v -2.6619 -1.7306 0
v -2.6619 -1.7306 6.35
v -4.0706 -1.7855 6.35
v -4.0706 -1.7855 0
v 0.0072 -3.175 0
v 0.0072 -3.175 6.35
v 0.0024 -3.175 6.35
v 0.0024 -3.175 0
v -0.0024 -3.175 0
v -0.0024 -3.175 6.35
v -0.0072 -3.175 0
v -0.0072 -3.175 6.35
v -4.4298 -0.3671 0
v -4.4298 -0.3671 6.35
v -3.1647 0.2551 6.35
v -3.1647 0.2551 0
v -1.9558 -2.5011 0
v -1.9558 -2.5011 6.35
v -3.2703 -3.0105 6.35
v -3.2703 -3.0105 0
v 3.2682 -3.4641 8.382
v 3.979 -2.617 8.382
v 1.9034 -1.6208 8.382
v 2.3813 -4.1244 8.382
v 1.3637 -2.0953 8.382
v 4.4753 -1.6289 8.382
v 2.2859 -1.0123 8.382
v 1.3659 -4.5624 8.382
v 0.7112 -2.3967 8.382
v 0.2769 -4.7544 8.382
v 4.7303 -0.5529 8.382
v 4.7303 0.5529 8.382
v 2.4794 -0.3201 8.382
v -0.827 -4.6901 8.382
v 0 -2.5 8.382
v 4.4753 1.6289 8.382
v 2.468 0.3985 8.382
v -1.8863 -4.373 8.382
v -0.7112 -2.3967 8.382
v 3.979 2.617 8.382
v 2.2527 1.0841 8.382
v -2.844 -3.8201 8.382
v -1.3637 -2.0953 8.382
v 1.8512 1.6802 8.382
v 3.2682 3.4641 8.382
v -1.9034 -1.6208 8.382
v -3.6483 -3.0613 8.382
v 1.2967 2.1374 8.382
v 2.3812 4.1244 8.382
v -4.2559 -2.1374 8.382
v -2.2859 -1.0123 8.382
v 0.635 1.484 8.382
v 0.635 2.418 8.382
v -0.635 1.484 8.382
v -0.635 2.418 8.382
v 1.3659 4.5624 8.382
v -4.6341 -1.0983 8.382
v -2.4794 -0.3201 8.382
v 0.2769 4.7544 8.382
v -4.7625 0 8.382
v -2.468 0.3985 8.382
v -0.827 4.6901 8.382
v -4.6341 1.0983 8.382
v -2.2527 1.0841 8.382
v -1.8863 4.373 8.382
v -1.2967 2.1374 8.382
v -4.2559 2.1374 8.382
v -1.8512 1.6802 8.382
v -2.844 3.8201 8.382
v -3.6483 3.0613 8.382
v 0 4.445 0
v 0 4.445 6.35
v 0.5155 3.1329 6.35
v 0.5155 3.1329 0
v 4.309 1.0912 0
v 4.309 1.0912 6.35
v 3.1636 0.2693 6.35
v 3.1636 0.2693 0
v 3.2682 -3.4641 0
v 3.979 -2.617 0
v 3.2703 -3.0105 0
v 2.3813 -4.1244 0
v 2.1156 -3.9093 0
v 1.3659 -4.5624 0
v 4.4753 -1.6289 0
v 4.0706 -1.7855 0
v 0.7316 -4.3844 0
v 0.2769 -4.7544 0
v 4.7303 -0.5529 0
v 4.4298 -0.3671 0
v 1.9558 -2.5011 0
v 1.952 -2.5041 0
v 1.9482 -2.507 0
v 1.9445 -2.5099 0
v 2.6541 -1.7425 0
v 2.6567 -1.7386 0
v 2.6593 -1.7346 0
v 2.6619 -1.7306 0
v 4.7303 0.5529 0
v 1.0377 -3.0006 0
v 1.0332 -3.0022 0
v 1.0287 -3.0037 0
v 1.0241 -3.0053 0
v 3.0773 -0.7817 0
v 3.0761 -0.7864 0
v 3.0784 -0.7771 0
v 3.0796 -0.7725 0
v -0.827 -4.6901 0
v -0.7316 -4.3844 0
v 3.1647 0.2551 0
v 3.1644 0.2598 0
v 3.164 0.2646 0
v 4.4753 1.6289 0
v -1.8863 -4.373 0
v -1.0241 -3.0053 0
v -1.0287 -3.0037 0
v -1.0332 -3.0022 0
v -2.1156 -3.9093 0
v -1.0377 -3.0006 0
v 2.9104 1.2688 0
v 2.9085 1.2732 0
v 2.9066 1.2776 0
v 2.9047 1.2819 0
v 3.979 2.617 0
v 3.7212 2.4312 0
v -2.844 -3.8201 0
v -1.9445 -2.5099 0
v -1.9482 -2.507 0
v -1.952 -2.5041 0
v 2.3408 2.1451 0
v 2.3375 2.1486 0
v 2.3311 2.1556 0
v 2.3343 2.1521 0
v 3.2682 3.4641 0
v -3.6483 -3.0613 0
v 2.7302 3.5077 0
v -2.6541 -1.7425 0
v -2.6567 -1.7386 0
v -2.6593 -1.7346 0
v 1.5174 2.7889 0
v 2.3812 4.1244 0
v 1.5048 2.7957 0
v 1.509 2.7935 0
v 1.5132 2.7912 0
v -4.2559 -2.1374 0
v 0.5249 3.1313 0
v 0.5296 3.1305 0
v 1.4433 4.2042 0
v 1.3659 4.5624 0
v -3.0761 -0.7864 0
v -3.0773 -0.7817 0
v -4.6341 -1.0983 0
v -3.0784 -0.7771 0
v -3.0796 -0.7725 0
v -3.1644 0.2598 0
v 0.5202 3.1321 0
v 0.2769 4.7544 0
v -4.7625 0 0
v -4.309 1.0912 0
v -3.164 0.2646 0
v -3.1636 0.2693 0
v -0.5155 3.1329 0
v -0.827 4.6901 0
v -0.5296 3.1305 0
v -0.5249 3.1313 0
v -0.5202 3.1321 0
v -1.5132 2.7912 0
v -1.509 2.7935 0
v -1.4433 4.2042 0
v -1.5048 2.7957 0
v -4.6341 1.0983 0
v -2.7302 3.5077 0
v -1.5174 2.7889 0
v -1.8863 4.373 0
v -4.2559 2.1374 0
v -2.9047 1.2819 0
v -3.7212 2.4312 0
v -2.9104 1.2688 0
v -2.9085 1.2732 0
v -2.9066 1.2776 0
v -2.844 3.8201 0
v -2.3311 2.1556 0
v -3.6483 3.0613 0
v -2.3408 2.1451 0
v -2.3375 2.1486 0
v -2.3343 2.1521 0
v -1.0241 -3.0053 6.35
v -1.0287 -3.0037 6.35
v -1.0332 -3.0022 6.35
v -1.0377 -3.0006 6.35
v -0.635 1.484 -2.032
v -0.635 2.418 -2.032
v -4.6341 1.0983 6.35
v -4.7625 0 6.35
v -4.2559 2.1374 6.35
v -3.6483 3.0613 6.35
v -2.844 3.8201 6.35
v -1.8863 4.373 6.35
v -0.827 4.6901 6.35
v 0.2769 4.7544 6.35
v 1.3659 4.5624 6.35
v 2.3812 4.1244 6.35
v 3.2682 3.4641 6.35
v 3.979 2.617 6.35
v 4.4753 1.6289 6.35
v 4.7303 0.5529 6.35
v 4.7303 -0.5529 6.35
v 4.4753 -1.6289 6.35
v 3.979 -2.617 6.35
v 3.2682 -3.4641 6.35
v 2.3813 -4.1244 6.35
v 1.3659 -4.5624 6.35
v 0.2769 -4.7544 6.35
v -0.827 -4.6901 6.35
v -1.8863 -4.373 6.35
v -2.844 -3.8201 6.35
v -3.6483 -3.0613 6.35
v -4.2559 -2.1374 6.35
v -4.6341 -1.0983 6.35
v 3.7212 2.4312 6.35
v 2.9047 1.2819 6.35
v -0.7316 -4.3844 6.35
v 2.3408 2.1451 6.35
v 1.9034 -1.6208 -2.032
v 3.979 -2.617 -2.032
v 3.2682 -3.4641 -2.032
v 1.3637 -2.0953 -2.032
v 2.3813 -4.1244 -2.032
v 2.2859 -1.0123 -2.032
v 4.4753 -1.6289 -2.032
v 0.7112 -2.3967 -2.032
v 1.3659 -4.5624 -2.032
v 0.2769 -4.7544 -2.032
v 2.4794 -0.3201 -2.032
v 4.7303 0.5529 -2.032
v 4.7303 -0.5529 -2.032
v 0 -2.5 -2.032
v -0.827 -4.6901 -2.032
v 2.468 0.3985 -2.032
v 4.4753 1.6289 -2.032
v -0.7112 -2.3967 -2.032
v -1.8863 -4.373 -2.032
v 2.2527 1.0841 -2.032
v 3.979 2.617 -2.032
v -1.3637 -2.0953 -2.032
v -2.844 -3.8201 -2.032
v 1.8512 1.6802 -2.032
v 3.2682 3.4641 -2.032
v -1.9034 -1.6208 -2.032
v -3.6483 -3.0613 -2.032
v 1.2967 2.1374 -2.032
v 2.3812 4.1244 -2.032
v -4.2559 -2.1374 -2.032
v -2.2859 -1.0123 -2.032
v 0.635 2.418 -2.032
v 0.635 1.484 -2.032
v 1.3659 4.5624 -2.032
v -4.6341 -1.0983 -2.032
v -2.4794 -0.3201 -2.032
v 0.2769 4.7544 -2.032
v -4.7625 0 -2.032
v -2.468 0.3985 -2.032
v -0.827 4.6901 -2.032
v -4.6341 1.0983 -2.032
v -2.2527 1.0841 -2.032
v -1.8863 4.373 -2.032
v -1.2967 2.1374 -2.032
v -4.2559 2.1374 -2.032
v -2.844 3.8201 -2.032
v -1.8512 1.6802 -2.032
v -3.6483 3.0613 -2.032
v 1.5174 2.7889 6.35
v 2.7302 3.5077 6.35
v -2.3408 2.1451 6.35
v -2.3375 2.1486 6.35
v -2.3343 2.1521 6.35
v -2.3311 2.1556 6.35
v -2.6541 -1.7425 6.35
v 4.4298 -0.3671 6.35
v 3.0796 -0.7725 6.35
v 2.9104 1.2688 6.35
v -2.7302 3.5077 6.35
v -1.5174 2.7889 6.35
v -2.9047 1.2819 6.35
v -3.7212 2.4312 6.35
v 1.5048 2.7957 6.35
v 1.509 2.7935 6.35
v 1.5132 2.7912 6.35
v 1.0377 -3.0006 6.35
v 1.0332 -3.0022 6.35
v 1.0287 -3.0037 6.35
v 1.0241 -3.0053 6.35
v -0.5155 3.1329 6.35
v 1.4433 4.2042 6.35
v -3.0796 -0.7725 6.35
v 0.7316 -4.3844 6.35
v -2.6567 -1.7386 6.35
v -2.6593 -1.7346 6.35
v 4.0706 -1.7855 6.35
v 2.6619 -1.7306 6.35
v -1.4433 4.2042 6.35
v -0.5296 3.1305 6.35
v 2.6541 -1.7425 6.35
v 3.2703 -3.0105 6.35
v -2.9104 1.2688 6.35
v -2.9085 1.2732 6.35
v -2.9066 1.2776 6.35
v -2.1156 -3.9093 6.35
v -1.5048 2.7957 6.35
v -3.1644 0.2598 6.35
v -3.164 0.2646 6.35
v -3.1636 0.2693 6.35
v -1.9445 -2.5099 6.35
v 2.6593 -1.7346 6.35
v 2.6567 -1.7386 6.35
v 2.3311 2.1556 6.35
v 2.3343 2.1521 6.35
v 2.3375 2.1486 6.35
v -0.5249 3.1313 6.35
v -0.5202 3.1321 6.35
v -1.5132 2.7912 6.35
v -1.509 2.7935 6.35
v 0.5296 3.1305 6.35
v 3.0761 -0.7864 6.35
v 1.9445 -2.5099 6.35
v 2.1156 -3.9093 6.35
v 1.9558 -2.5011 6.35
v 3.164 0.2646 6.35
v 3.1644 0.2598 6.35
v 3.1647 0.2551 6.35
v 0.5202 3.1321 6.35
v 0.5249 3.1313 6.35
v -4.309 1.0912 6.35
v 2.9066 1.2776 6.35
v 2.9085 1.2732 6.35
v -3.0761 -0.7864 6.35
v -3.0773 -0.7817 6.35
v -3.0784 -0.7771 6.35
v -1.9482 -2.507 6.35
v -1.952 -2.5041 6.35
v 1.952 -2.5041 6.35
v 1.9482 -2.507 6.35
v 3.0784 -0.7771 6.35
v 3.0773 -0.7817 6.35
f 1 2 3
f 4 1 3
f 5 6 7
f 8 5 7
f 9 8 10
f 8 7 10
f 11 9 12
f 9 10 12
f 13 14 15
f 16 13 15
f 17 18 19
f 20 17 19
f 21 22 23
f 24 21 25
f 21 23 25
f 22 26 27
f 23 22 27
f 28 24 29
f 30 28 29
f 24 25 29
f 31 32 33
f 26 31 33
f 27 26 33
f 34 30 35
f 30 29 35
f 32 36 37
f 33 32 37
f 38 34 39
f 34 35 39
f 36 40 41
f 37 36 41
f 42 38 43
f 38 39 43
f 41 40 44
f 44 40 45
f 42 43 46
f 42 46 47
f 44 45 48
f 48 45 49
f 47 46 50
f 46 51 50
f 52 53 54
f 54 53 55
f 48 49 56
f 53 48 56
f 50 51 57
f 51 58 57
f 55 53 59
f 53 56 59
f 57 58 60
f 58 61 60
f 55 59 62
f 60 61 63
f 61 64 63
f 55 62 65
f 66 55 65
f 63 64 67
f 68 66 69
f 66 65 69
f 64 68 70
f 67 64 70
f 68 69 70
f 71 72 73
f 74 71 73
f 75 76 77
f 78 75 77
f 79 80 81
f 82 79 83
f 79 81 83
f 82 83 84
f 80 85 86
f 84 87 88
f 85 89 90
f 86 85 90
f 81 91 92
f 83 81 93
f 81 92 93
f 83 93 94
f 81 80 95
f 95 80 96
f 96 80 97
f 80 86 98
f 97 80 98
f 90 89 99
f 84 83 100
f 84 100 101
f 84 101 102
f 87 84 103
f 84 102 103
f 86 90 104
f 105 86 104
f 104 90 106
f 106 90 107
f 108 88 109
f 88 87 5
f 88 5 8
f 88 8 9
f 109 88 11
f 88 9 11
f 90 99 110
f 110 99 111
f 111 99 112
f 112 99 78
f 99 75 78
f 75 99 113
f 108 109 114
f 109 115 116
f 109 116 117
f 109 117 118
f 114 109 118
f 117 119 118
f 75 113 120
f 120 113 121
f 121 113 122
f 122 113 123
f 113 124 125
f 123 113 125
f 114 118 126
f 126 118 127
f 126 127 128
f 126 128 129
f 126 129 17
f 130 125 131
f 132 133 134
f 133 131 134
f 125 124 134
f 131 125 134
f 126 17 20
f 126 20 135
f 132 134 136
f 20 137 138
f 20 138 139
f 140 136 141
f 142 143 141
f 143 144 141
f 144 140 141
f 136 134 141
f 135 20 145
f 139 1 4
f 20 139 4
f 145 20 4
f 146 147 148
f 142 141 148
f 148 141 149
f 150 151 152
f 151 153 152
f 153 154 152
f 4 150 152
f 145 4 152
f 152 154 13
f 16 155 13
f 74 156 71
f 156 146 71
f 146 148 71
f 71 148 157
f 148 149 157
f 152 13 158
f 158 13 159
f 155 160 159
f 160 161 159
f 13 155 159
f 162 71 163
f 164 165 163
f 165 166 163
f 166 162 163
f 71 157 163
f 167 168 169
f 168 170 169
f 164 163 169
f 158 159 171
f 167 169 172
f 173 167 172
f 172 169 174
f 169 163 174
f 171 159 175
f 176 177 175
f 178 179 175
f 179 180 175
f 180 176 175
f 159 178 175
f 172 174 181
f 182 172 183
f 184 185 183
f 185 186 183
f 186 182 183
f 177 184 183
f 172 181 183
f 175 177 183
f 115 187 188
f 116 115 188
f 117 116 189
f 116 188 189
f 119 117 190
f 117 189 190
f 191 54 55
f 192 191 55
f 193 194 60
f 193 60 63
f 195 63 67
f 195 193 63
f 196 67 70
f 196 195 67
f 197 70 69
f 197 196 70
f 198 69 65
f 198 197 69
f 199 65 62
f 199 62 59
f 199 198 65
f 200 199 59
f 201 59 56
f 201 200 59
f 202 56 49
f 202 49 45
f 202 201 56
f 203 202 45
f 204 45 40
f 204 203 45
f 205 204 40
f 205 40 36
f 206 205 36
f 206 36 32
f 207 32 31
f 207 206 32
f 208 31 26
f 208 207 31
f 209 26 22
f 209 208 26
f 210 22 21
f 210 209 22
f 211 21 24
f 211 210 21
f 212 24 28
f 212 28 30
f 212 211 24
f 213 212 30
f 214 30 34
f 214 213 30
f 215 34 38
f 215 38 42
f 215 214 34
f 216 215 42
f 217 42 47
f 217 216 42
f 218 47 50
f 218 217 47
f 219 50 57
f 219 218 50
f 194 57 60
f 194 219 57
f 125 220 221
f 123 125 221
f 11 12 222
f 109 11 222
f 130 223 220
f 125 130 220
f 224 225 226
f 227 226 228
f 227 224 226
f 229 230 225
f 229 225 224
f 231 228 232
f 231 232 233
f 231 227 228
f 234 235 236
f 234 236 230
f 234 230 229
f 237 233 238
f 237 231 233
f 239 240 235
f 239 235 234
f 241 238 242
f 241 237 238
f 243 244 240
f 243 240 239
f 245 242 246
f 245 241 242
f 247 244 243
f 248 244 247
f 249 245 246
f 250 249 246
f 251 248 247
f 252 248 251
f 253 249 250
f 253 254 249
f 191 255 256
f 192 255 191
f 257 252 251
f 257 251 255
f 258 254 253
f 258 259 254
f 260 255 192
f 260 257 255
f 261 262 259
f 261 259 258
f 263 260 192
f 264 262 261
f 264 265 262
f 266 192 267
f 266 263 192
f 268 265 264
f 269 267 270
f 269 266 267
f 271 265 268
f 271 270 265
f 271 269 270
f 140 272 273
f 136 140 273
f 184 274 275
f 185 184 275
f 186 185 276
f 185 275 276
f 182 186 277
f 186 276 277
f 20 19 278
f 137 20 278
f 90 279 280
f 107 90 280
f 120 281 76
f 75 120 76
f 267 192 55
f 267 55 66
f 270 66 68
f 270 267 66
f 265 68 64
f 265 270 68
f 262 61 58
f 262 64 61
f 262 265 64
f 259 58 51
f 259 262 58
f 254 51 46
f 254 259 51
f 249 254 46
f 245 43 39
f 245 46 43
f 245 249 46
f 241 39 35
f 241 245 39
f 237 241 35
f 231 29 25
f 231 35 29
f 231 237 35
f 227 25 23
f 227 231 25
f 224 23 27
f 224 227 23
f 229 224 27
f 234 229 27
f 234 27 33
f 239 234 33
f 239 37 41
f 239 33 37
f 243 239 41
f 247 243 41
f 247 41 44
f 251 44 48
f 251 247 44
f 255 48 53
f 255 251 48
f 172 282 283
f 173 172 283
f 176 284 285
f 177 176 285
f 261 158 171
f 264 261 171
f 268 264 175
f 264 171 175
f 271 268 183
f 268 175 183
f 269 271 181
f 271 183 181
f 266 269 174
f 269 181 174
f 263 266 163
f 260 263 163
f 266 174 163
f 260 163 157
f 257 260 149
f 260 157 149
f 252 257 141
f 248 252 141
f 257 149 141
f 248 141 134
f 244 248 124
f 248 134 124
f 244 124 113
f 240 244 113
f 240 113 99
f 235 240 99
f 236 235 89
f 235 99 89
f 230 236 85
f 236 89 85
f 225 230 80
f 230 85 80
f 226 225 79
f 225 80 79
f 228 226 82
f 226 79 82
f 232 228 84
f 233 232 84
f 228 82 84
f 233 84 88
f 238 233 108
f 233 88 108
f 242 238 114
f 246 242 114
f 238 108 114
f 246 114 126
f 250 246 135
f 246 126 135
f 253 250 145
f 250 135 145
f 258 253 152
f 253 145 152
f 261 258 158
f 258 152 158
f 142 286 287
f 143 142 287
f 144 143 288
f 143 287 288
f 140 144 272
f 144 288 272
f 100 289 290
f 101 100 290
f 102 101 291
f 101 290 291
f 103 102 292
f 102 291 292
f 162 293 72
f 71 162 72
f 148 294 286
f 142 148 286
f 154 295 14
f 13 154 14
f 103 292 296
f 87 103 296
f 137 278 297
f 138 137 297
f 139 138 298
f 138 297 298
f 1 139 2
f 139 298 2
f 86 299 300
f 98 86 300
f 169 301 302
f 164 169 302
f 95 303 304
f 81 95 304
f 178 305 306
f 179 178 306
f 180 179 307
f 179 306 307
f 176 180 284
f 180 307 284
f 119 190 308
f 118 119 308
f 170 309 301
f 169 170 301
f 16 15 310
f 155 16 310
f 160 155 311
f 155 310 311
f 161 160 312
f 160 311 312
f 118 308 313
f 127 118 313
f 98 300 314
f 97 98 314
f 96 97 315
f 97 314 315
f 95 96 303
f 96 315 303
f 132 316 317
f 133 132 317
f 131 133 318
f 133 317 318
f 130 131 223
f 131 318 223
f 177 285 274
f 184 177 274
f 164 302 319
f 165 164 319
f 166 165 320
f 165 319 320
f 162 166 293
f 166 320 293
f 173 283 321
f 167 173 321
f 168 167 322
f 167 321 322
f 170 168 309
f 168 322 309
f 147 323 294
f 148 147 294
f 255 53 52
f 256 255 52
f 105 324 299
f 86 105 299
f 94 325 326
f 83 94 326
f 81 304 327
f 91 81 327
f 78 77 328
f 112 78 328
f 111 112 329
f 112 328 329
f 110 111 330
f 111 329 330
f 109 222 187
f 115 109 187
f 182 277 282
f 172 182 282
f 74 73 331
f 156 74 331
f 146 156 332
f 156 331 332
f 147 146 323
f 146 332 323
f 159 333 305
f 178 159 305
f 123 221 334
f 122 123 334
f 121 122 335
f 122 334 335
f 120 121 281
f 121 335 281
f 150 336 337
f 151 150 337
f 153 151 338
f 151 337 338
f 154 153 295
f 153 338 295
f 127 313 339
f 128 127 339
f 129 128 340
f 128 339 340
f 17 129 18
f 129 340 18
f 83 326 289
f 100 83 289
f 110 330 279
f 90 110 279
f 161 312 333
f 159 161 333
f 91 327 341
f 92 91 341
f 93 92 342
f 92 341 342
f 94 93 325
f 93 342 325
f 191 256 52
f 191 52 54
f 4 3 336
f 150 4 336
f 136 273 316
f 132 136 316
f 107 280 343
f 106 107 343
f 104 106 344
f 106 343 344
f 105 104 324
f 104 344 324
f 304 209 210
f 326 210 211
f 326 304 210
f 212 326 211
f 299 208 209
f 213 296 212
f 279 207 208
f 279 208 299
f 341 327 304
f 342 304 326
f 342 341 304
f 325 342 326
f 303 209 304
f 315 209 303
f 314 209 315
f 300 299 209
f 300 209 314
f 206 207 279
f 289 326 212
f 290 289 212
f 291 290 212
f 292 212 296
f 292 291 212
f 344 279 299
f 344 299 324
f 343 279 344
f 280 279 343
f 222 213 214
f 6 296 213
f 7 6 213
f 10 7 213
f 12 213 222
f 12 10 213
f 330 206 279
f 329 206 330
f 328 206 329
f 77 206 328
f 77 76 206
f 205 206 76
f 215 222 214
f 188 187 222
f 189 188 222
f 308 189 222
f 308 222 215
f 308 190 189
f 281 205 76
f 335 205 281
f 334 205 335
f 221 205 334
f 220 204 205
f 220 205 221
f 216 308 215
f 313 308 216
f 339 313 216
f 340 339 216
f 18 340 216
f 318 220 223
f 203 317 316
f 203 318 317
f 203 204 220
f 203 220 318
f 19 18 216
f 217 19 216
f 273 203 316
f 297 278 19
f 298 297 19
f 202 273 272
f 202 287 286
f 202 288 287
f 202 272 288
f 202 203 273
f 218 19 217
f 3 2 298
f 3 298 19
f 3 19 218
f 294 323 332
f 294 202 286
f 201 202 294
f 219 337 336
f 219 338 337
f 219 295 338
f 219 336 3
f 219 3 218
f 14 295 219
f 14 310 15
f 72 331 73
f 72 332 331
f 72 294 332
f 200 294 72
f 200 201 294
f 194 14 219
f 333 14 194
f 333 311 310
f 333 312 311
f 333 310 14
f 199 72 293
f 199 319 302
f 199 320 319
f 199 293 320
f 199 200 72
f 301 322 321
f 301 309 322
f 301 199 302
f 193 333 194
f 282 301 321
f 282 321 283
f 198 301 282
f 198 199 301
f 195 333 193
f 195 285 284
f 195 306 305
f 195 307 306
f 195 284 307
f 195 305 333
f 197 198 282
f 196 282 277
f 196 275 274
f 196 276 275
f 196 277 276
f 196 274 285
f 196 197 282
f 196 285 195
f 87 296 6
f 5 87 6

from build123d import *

# Parameters (mm, degrees)
BOSS_EXTRUDE1_DEPTH = 3.175
SKETCH2_R           = 4.7625
BOSS_EXTRUDE2_DEPTH = 2.032
CUT_EXTRUDE1_DEPTH  = 17.018


with BuildPart() as part:
    # Sketch1 → Boss-Extrude1 (new body)
    with BuildSketch(Plane.XY):
        with BuildLine():
            Line((0, 4.445), (0.515524368, 3.132867636))
            ThreePointArc((0.515524368, 3.132867636), (0.522587824, 3.131697138), (0.529648623, 3.130510715))
            Line((0.529648623, 3.130510715), (1.443289141, 4.204157639))
            Line((1.443289141, 4.204157639), (1.504832294, 2.795729738))
            ThreePointArc((1.504832294, 2.795729738), (1.511132973, 2.79232916), (1.517425967, 2.788914383))
            Line((1.517425967, 2.788914383), (2.730175508, 3.507729564))
            Line((2.730175508, 3.507729564), (2.331068291, 2.155631142))
            ThreePointArc((2.331068291, 2.155631142), (2.335923416, 2.15036899), (2.340766663, 2.145095903))
            Line((2.340766663, 2.145095903), (3.721204996, 2.431184563))
            Line((3.721204996, 2.431184563), (2.904696869, 1.281936464))
            ThreePointArc((2.904696869, 1.281936464), (2.907580312, 1.275382973), (2.910448969, 1.268822997))
            Line((2.910448969, 1.268822997), (4.308984182, 1.09118299))
            Line((4.308984182, 1.09118299), (3.16355647, 0.269324079))
            ThreePointArc((3.16355647, 0.269324079), (3.164155765, 0.262189422), (3.16473897, 0.255053432))
            Line((3.16473897, 0.255053432), (4.429818071, -0.367065191))
            Line((4.429818071, -0.367065191), (3.07959564, -0.772473749))
            ThreePointArc((3.07959564, -0.772473749), (3.077845844, -0.779416422), (3.076080397, -0.78635513))
            Line((3.076080397, -0.78635513), (4.070612437, -1.785536163))
            Line((4.070612437, -1.785536163), (2.661912838, -1.730562061))
            ThreePointArc((2.661912838, -1.730562061), (2.658003568, -1.736560402), (2.654080783, -1.742549913))
            Line((2.654080783, -1.742549913), (3.270292783, -3.010516586))
            Line((3.270292783, -3.010516586), (1.955770475, -2.50111712))
            ThreePointArc((1.955770475, -2.50111712), (1.950125363, -2.505521117), (1.944470334, -2.509912373))
            Line((1.944470334, -2.509912373), (2.115586162, -3.909260824))
            Line((2.115586162, -3.909260824), (1.037690035, -3.000637331))
            ThreePointArc((1.037690035, -3.000637331), (1.030920815, -3.002969742), (1.024146352, -3.005286883))
            Line((1.024146352, -3.005286883), (0.731622954, -4.384375994))
            Line((0.731622954, -4.384375994), (0.007159778, -3.174991927))
            ThreePointArc((0.007159778, -3.174991927), (0, -3.175), (-0.007159778, -3.174991927))
            Line((-0.007159778, -3.174991927), (-0.731622954, -4.384375994))
            Line((-0.731622954, -4.384375994), (-1.024146352, -3.005286883))
            ThreePointArc((-1.024146352, -3.005286883), (-1.030920815, -3.002969742), (-1.037690035, -3.000637331))
            Line((-1.037690035, -3.000637331), (-2.115586162, -3.909260824))
            Line((-2.115586162, -3.909260824), (-1.944470334, -2.509912373))
            ThreePointArc((-1.944470334, -2.509912373), (-1.950125363, -2.505521117), (-1.955770475, -2.50111712))
            Line((-1.955770475, -2.50111712), (-3.270292783, -3.010516586))
            Line((-3.270292783, -3.010516586), (-2.654080783, -1.742549913))
            ThreePointArc((-2.654080783, -1.742549913), (-2.658003568, -1.736560402), (-2.661912838, -1.730562061))
            Line((-2.661912838, -1.730562061), (-4.070612437, -1.785536163))
            Line((-4.070612437, -1.785536163), (-3.076080397, -0.78635513))
            ThreePointArc((-3.076080397, -0.78635513), (-3.077845844, -0.779416422), (-3.07959564, -0.772473749))
            Line((-3.07959564, -0.772473749), (-4.429818071, -0.367065191))
            Line((-4.429818071, -0.367065191), (-3.16473897, 0.255053432))
            ThreePointArc((-3.16473897, 0.255053432), (-3.164155765, 0.262189422), (-3.16355647, 0.269324079))
            Line((-3.16355647, 0.269324079), (-4.308984182, 1.09118299))
            Line((-4.308984182, 1.09118299), (-2.910448969, 1.268822997))
            ThreePointArc((-2.910448969, 1.268822997), (-2.907580312, 1.275382973), (-2.904696869, 1.281936464))
            Line((-2.904696869, 1.281936464), (-3.721204996, 2.431184563))
            Line((-3.721204996, 2.431184563), (-2.340766663, 2.145095903))
            ThreePointArc((-2.340766663, 2.145095903), (-2.335923416, 2.15036899), (-2.331068291, 2.155631142))
            Line((-2.331068291, 2.155631142), (-2.730175508, 3.507729564))
            Line((-2.730175508, 3.507729564), (-1.517425967, 2.788914383))
            ThreePointArc((-1.517425967, 2.788914383), (-1.511132973, 2.79232916), (-1.504832294, 2.795729738))
            Line((-1.504832294, 2.795729738), (-1.443289141, 4.204157639))
            Line((-1.443289141, 4.204157639), (-0.529648623, 3.130510715))
            ThreePointArc((-0.529648623, 3.130510715), (-0.522587824, 3.131697138), (-0.515524368, 3.132867636))
            Line((-0.515524368, 3.132867636), (0, 4.445))
        make_face()
    extrude(amount=BOSS_EXTRUDE1_DEPTH)

    # Sketch2 → Boss-Extrude2 (add)
    with BuildSketch(Plane(origin=(0, 0, 0), x_dir=(-1, 0, 0), z_dir=(0, 0, -1))):
        Circle(SKETCH2_R)
    extrude(amount=BOSS_EXTRUDE2_DEPTH)

    # Mirror1: part across plane


with BuildPart() as part_1:
    add(part.part)
    add(part.part.mirror(Plane.XY.offset(3.175)))

    # Sketch3 → Cut-Extrude1 (cut)
    with BuildSketch(Plane(origin=(0, 0, -2.032), x_dir=(-1, 0, 0), z_dir=(0, 0, -1))):
        with BuildLine():
            Line((-0.635, 2.418010546), (-0.635, 1.484))
            Line((-0.635, 1.484), (0.635, 1.484))
            Line((0.635, 1.484), (0.635, 2.418010546))
            ThreePointArc((0.635, 2.418010546), (0, -2.5), (-0.635, 2.418010546))
        make_face()
    extrude(amount=-CUT_EXTRUDE1_DEPTH, mode=Mode.SUBTRACT)


solid = part_1.part
